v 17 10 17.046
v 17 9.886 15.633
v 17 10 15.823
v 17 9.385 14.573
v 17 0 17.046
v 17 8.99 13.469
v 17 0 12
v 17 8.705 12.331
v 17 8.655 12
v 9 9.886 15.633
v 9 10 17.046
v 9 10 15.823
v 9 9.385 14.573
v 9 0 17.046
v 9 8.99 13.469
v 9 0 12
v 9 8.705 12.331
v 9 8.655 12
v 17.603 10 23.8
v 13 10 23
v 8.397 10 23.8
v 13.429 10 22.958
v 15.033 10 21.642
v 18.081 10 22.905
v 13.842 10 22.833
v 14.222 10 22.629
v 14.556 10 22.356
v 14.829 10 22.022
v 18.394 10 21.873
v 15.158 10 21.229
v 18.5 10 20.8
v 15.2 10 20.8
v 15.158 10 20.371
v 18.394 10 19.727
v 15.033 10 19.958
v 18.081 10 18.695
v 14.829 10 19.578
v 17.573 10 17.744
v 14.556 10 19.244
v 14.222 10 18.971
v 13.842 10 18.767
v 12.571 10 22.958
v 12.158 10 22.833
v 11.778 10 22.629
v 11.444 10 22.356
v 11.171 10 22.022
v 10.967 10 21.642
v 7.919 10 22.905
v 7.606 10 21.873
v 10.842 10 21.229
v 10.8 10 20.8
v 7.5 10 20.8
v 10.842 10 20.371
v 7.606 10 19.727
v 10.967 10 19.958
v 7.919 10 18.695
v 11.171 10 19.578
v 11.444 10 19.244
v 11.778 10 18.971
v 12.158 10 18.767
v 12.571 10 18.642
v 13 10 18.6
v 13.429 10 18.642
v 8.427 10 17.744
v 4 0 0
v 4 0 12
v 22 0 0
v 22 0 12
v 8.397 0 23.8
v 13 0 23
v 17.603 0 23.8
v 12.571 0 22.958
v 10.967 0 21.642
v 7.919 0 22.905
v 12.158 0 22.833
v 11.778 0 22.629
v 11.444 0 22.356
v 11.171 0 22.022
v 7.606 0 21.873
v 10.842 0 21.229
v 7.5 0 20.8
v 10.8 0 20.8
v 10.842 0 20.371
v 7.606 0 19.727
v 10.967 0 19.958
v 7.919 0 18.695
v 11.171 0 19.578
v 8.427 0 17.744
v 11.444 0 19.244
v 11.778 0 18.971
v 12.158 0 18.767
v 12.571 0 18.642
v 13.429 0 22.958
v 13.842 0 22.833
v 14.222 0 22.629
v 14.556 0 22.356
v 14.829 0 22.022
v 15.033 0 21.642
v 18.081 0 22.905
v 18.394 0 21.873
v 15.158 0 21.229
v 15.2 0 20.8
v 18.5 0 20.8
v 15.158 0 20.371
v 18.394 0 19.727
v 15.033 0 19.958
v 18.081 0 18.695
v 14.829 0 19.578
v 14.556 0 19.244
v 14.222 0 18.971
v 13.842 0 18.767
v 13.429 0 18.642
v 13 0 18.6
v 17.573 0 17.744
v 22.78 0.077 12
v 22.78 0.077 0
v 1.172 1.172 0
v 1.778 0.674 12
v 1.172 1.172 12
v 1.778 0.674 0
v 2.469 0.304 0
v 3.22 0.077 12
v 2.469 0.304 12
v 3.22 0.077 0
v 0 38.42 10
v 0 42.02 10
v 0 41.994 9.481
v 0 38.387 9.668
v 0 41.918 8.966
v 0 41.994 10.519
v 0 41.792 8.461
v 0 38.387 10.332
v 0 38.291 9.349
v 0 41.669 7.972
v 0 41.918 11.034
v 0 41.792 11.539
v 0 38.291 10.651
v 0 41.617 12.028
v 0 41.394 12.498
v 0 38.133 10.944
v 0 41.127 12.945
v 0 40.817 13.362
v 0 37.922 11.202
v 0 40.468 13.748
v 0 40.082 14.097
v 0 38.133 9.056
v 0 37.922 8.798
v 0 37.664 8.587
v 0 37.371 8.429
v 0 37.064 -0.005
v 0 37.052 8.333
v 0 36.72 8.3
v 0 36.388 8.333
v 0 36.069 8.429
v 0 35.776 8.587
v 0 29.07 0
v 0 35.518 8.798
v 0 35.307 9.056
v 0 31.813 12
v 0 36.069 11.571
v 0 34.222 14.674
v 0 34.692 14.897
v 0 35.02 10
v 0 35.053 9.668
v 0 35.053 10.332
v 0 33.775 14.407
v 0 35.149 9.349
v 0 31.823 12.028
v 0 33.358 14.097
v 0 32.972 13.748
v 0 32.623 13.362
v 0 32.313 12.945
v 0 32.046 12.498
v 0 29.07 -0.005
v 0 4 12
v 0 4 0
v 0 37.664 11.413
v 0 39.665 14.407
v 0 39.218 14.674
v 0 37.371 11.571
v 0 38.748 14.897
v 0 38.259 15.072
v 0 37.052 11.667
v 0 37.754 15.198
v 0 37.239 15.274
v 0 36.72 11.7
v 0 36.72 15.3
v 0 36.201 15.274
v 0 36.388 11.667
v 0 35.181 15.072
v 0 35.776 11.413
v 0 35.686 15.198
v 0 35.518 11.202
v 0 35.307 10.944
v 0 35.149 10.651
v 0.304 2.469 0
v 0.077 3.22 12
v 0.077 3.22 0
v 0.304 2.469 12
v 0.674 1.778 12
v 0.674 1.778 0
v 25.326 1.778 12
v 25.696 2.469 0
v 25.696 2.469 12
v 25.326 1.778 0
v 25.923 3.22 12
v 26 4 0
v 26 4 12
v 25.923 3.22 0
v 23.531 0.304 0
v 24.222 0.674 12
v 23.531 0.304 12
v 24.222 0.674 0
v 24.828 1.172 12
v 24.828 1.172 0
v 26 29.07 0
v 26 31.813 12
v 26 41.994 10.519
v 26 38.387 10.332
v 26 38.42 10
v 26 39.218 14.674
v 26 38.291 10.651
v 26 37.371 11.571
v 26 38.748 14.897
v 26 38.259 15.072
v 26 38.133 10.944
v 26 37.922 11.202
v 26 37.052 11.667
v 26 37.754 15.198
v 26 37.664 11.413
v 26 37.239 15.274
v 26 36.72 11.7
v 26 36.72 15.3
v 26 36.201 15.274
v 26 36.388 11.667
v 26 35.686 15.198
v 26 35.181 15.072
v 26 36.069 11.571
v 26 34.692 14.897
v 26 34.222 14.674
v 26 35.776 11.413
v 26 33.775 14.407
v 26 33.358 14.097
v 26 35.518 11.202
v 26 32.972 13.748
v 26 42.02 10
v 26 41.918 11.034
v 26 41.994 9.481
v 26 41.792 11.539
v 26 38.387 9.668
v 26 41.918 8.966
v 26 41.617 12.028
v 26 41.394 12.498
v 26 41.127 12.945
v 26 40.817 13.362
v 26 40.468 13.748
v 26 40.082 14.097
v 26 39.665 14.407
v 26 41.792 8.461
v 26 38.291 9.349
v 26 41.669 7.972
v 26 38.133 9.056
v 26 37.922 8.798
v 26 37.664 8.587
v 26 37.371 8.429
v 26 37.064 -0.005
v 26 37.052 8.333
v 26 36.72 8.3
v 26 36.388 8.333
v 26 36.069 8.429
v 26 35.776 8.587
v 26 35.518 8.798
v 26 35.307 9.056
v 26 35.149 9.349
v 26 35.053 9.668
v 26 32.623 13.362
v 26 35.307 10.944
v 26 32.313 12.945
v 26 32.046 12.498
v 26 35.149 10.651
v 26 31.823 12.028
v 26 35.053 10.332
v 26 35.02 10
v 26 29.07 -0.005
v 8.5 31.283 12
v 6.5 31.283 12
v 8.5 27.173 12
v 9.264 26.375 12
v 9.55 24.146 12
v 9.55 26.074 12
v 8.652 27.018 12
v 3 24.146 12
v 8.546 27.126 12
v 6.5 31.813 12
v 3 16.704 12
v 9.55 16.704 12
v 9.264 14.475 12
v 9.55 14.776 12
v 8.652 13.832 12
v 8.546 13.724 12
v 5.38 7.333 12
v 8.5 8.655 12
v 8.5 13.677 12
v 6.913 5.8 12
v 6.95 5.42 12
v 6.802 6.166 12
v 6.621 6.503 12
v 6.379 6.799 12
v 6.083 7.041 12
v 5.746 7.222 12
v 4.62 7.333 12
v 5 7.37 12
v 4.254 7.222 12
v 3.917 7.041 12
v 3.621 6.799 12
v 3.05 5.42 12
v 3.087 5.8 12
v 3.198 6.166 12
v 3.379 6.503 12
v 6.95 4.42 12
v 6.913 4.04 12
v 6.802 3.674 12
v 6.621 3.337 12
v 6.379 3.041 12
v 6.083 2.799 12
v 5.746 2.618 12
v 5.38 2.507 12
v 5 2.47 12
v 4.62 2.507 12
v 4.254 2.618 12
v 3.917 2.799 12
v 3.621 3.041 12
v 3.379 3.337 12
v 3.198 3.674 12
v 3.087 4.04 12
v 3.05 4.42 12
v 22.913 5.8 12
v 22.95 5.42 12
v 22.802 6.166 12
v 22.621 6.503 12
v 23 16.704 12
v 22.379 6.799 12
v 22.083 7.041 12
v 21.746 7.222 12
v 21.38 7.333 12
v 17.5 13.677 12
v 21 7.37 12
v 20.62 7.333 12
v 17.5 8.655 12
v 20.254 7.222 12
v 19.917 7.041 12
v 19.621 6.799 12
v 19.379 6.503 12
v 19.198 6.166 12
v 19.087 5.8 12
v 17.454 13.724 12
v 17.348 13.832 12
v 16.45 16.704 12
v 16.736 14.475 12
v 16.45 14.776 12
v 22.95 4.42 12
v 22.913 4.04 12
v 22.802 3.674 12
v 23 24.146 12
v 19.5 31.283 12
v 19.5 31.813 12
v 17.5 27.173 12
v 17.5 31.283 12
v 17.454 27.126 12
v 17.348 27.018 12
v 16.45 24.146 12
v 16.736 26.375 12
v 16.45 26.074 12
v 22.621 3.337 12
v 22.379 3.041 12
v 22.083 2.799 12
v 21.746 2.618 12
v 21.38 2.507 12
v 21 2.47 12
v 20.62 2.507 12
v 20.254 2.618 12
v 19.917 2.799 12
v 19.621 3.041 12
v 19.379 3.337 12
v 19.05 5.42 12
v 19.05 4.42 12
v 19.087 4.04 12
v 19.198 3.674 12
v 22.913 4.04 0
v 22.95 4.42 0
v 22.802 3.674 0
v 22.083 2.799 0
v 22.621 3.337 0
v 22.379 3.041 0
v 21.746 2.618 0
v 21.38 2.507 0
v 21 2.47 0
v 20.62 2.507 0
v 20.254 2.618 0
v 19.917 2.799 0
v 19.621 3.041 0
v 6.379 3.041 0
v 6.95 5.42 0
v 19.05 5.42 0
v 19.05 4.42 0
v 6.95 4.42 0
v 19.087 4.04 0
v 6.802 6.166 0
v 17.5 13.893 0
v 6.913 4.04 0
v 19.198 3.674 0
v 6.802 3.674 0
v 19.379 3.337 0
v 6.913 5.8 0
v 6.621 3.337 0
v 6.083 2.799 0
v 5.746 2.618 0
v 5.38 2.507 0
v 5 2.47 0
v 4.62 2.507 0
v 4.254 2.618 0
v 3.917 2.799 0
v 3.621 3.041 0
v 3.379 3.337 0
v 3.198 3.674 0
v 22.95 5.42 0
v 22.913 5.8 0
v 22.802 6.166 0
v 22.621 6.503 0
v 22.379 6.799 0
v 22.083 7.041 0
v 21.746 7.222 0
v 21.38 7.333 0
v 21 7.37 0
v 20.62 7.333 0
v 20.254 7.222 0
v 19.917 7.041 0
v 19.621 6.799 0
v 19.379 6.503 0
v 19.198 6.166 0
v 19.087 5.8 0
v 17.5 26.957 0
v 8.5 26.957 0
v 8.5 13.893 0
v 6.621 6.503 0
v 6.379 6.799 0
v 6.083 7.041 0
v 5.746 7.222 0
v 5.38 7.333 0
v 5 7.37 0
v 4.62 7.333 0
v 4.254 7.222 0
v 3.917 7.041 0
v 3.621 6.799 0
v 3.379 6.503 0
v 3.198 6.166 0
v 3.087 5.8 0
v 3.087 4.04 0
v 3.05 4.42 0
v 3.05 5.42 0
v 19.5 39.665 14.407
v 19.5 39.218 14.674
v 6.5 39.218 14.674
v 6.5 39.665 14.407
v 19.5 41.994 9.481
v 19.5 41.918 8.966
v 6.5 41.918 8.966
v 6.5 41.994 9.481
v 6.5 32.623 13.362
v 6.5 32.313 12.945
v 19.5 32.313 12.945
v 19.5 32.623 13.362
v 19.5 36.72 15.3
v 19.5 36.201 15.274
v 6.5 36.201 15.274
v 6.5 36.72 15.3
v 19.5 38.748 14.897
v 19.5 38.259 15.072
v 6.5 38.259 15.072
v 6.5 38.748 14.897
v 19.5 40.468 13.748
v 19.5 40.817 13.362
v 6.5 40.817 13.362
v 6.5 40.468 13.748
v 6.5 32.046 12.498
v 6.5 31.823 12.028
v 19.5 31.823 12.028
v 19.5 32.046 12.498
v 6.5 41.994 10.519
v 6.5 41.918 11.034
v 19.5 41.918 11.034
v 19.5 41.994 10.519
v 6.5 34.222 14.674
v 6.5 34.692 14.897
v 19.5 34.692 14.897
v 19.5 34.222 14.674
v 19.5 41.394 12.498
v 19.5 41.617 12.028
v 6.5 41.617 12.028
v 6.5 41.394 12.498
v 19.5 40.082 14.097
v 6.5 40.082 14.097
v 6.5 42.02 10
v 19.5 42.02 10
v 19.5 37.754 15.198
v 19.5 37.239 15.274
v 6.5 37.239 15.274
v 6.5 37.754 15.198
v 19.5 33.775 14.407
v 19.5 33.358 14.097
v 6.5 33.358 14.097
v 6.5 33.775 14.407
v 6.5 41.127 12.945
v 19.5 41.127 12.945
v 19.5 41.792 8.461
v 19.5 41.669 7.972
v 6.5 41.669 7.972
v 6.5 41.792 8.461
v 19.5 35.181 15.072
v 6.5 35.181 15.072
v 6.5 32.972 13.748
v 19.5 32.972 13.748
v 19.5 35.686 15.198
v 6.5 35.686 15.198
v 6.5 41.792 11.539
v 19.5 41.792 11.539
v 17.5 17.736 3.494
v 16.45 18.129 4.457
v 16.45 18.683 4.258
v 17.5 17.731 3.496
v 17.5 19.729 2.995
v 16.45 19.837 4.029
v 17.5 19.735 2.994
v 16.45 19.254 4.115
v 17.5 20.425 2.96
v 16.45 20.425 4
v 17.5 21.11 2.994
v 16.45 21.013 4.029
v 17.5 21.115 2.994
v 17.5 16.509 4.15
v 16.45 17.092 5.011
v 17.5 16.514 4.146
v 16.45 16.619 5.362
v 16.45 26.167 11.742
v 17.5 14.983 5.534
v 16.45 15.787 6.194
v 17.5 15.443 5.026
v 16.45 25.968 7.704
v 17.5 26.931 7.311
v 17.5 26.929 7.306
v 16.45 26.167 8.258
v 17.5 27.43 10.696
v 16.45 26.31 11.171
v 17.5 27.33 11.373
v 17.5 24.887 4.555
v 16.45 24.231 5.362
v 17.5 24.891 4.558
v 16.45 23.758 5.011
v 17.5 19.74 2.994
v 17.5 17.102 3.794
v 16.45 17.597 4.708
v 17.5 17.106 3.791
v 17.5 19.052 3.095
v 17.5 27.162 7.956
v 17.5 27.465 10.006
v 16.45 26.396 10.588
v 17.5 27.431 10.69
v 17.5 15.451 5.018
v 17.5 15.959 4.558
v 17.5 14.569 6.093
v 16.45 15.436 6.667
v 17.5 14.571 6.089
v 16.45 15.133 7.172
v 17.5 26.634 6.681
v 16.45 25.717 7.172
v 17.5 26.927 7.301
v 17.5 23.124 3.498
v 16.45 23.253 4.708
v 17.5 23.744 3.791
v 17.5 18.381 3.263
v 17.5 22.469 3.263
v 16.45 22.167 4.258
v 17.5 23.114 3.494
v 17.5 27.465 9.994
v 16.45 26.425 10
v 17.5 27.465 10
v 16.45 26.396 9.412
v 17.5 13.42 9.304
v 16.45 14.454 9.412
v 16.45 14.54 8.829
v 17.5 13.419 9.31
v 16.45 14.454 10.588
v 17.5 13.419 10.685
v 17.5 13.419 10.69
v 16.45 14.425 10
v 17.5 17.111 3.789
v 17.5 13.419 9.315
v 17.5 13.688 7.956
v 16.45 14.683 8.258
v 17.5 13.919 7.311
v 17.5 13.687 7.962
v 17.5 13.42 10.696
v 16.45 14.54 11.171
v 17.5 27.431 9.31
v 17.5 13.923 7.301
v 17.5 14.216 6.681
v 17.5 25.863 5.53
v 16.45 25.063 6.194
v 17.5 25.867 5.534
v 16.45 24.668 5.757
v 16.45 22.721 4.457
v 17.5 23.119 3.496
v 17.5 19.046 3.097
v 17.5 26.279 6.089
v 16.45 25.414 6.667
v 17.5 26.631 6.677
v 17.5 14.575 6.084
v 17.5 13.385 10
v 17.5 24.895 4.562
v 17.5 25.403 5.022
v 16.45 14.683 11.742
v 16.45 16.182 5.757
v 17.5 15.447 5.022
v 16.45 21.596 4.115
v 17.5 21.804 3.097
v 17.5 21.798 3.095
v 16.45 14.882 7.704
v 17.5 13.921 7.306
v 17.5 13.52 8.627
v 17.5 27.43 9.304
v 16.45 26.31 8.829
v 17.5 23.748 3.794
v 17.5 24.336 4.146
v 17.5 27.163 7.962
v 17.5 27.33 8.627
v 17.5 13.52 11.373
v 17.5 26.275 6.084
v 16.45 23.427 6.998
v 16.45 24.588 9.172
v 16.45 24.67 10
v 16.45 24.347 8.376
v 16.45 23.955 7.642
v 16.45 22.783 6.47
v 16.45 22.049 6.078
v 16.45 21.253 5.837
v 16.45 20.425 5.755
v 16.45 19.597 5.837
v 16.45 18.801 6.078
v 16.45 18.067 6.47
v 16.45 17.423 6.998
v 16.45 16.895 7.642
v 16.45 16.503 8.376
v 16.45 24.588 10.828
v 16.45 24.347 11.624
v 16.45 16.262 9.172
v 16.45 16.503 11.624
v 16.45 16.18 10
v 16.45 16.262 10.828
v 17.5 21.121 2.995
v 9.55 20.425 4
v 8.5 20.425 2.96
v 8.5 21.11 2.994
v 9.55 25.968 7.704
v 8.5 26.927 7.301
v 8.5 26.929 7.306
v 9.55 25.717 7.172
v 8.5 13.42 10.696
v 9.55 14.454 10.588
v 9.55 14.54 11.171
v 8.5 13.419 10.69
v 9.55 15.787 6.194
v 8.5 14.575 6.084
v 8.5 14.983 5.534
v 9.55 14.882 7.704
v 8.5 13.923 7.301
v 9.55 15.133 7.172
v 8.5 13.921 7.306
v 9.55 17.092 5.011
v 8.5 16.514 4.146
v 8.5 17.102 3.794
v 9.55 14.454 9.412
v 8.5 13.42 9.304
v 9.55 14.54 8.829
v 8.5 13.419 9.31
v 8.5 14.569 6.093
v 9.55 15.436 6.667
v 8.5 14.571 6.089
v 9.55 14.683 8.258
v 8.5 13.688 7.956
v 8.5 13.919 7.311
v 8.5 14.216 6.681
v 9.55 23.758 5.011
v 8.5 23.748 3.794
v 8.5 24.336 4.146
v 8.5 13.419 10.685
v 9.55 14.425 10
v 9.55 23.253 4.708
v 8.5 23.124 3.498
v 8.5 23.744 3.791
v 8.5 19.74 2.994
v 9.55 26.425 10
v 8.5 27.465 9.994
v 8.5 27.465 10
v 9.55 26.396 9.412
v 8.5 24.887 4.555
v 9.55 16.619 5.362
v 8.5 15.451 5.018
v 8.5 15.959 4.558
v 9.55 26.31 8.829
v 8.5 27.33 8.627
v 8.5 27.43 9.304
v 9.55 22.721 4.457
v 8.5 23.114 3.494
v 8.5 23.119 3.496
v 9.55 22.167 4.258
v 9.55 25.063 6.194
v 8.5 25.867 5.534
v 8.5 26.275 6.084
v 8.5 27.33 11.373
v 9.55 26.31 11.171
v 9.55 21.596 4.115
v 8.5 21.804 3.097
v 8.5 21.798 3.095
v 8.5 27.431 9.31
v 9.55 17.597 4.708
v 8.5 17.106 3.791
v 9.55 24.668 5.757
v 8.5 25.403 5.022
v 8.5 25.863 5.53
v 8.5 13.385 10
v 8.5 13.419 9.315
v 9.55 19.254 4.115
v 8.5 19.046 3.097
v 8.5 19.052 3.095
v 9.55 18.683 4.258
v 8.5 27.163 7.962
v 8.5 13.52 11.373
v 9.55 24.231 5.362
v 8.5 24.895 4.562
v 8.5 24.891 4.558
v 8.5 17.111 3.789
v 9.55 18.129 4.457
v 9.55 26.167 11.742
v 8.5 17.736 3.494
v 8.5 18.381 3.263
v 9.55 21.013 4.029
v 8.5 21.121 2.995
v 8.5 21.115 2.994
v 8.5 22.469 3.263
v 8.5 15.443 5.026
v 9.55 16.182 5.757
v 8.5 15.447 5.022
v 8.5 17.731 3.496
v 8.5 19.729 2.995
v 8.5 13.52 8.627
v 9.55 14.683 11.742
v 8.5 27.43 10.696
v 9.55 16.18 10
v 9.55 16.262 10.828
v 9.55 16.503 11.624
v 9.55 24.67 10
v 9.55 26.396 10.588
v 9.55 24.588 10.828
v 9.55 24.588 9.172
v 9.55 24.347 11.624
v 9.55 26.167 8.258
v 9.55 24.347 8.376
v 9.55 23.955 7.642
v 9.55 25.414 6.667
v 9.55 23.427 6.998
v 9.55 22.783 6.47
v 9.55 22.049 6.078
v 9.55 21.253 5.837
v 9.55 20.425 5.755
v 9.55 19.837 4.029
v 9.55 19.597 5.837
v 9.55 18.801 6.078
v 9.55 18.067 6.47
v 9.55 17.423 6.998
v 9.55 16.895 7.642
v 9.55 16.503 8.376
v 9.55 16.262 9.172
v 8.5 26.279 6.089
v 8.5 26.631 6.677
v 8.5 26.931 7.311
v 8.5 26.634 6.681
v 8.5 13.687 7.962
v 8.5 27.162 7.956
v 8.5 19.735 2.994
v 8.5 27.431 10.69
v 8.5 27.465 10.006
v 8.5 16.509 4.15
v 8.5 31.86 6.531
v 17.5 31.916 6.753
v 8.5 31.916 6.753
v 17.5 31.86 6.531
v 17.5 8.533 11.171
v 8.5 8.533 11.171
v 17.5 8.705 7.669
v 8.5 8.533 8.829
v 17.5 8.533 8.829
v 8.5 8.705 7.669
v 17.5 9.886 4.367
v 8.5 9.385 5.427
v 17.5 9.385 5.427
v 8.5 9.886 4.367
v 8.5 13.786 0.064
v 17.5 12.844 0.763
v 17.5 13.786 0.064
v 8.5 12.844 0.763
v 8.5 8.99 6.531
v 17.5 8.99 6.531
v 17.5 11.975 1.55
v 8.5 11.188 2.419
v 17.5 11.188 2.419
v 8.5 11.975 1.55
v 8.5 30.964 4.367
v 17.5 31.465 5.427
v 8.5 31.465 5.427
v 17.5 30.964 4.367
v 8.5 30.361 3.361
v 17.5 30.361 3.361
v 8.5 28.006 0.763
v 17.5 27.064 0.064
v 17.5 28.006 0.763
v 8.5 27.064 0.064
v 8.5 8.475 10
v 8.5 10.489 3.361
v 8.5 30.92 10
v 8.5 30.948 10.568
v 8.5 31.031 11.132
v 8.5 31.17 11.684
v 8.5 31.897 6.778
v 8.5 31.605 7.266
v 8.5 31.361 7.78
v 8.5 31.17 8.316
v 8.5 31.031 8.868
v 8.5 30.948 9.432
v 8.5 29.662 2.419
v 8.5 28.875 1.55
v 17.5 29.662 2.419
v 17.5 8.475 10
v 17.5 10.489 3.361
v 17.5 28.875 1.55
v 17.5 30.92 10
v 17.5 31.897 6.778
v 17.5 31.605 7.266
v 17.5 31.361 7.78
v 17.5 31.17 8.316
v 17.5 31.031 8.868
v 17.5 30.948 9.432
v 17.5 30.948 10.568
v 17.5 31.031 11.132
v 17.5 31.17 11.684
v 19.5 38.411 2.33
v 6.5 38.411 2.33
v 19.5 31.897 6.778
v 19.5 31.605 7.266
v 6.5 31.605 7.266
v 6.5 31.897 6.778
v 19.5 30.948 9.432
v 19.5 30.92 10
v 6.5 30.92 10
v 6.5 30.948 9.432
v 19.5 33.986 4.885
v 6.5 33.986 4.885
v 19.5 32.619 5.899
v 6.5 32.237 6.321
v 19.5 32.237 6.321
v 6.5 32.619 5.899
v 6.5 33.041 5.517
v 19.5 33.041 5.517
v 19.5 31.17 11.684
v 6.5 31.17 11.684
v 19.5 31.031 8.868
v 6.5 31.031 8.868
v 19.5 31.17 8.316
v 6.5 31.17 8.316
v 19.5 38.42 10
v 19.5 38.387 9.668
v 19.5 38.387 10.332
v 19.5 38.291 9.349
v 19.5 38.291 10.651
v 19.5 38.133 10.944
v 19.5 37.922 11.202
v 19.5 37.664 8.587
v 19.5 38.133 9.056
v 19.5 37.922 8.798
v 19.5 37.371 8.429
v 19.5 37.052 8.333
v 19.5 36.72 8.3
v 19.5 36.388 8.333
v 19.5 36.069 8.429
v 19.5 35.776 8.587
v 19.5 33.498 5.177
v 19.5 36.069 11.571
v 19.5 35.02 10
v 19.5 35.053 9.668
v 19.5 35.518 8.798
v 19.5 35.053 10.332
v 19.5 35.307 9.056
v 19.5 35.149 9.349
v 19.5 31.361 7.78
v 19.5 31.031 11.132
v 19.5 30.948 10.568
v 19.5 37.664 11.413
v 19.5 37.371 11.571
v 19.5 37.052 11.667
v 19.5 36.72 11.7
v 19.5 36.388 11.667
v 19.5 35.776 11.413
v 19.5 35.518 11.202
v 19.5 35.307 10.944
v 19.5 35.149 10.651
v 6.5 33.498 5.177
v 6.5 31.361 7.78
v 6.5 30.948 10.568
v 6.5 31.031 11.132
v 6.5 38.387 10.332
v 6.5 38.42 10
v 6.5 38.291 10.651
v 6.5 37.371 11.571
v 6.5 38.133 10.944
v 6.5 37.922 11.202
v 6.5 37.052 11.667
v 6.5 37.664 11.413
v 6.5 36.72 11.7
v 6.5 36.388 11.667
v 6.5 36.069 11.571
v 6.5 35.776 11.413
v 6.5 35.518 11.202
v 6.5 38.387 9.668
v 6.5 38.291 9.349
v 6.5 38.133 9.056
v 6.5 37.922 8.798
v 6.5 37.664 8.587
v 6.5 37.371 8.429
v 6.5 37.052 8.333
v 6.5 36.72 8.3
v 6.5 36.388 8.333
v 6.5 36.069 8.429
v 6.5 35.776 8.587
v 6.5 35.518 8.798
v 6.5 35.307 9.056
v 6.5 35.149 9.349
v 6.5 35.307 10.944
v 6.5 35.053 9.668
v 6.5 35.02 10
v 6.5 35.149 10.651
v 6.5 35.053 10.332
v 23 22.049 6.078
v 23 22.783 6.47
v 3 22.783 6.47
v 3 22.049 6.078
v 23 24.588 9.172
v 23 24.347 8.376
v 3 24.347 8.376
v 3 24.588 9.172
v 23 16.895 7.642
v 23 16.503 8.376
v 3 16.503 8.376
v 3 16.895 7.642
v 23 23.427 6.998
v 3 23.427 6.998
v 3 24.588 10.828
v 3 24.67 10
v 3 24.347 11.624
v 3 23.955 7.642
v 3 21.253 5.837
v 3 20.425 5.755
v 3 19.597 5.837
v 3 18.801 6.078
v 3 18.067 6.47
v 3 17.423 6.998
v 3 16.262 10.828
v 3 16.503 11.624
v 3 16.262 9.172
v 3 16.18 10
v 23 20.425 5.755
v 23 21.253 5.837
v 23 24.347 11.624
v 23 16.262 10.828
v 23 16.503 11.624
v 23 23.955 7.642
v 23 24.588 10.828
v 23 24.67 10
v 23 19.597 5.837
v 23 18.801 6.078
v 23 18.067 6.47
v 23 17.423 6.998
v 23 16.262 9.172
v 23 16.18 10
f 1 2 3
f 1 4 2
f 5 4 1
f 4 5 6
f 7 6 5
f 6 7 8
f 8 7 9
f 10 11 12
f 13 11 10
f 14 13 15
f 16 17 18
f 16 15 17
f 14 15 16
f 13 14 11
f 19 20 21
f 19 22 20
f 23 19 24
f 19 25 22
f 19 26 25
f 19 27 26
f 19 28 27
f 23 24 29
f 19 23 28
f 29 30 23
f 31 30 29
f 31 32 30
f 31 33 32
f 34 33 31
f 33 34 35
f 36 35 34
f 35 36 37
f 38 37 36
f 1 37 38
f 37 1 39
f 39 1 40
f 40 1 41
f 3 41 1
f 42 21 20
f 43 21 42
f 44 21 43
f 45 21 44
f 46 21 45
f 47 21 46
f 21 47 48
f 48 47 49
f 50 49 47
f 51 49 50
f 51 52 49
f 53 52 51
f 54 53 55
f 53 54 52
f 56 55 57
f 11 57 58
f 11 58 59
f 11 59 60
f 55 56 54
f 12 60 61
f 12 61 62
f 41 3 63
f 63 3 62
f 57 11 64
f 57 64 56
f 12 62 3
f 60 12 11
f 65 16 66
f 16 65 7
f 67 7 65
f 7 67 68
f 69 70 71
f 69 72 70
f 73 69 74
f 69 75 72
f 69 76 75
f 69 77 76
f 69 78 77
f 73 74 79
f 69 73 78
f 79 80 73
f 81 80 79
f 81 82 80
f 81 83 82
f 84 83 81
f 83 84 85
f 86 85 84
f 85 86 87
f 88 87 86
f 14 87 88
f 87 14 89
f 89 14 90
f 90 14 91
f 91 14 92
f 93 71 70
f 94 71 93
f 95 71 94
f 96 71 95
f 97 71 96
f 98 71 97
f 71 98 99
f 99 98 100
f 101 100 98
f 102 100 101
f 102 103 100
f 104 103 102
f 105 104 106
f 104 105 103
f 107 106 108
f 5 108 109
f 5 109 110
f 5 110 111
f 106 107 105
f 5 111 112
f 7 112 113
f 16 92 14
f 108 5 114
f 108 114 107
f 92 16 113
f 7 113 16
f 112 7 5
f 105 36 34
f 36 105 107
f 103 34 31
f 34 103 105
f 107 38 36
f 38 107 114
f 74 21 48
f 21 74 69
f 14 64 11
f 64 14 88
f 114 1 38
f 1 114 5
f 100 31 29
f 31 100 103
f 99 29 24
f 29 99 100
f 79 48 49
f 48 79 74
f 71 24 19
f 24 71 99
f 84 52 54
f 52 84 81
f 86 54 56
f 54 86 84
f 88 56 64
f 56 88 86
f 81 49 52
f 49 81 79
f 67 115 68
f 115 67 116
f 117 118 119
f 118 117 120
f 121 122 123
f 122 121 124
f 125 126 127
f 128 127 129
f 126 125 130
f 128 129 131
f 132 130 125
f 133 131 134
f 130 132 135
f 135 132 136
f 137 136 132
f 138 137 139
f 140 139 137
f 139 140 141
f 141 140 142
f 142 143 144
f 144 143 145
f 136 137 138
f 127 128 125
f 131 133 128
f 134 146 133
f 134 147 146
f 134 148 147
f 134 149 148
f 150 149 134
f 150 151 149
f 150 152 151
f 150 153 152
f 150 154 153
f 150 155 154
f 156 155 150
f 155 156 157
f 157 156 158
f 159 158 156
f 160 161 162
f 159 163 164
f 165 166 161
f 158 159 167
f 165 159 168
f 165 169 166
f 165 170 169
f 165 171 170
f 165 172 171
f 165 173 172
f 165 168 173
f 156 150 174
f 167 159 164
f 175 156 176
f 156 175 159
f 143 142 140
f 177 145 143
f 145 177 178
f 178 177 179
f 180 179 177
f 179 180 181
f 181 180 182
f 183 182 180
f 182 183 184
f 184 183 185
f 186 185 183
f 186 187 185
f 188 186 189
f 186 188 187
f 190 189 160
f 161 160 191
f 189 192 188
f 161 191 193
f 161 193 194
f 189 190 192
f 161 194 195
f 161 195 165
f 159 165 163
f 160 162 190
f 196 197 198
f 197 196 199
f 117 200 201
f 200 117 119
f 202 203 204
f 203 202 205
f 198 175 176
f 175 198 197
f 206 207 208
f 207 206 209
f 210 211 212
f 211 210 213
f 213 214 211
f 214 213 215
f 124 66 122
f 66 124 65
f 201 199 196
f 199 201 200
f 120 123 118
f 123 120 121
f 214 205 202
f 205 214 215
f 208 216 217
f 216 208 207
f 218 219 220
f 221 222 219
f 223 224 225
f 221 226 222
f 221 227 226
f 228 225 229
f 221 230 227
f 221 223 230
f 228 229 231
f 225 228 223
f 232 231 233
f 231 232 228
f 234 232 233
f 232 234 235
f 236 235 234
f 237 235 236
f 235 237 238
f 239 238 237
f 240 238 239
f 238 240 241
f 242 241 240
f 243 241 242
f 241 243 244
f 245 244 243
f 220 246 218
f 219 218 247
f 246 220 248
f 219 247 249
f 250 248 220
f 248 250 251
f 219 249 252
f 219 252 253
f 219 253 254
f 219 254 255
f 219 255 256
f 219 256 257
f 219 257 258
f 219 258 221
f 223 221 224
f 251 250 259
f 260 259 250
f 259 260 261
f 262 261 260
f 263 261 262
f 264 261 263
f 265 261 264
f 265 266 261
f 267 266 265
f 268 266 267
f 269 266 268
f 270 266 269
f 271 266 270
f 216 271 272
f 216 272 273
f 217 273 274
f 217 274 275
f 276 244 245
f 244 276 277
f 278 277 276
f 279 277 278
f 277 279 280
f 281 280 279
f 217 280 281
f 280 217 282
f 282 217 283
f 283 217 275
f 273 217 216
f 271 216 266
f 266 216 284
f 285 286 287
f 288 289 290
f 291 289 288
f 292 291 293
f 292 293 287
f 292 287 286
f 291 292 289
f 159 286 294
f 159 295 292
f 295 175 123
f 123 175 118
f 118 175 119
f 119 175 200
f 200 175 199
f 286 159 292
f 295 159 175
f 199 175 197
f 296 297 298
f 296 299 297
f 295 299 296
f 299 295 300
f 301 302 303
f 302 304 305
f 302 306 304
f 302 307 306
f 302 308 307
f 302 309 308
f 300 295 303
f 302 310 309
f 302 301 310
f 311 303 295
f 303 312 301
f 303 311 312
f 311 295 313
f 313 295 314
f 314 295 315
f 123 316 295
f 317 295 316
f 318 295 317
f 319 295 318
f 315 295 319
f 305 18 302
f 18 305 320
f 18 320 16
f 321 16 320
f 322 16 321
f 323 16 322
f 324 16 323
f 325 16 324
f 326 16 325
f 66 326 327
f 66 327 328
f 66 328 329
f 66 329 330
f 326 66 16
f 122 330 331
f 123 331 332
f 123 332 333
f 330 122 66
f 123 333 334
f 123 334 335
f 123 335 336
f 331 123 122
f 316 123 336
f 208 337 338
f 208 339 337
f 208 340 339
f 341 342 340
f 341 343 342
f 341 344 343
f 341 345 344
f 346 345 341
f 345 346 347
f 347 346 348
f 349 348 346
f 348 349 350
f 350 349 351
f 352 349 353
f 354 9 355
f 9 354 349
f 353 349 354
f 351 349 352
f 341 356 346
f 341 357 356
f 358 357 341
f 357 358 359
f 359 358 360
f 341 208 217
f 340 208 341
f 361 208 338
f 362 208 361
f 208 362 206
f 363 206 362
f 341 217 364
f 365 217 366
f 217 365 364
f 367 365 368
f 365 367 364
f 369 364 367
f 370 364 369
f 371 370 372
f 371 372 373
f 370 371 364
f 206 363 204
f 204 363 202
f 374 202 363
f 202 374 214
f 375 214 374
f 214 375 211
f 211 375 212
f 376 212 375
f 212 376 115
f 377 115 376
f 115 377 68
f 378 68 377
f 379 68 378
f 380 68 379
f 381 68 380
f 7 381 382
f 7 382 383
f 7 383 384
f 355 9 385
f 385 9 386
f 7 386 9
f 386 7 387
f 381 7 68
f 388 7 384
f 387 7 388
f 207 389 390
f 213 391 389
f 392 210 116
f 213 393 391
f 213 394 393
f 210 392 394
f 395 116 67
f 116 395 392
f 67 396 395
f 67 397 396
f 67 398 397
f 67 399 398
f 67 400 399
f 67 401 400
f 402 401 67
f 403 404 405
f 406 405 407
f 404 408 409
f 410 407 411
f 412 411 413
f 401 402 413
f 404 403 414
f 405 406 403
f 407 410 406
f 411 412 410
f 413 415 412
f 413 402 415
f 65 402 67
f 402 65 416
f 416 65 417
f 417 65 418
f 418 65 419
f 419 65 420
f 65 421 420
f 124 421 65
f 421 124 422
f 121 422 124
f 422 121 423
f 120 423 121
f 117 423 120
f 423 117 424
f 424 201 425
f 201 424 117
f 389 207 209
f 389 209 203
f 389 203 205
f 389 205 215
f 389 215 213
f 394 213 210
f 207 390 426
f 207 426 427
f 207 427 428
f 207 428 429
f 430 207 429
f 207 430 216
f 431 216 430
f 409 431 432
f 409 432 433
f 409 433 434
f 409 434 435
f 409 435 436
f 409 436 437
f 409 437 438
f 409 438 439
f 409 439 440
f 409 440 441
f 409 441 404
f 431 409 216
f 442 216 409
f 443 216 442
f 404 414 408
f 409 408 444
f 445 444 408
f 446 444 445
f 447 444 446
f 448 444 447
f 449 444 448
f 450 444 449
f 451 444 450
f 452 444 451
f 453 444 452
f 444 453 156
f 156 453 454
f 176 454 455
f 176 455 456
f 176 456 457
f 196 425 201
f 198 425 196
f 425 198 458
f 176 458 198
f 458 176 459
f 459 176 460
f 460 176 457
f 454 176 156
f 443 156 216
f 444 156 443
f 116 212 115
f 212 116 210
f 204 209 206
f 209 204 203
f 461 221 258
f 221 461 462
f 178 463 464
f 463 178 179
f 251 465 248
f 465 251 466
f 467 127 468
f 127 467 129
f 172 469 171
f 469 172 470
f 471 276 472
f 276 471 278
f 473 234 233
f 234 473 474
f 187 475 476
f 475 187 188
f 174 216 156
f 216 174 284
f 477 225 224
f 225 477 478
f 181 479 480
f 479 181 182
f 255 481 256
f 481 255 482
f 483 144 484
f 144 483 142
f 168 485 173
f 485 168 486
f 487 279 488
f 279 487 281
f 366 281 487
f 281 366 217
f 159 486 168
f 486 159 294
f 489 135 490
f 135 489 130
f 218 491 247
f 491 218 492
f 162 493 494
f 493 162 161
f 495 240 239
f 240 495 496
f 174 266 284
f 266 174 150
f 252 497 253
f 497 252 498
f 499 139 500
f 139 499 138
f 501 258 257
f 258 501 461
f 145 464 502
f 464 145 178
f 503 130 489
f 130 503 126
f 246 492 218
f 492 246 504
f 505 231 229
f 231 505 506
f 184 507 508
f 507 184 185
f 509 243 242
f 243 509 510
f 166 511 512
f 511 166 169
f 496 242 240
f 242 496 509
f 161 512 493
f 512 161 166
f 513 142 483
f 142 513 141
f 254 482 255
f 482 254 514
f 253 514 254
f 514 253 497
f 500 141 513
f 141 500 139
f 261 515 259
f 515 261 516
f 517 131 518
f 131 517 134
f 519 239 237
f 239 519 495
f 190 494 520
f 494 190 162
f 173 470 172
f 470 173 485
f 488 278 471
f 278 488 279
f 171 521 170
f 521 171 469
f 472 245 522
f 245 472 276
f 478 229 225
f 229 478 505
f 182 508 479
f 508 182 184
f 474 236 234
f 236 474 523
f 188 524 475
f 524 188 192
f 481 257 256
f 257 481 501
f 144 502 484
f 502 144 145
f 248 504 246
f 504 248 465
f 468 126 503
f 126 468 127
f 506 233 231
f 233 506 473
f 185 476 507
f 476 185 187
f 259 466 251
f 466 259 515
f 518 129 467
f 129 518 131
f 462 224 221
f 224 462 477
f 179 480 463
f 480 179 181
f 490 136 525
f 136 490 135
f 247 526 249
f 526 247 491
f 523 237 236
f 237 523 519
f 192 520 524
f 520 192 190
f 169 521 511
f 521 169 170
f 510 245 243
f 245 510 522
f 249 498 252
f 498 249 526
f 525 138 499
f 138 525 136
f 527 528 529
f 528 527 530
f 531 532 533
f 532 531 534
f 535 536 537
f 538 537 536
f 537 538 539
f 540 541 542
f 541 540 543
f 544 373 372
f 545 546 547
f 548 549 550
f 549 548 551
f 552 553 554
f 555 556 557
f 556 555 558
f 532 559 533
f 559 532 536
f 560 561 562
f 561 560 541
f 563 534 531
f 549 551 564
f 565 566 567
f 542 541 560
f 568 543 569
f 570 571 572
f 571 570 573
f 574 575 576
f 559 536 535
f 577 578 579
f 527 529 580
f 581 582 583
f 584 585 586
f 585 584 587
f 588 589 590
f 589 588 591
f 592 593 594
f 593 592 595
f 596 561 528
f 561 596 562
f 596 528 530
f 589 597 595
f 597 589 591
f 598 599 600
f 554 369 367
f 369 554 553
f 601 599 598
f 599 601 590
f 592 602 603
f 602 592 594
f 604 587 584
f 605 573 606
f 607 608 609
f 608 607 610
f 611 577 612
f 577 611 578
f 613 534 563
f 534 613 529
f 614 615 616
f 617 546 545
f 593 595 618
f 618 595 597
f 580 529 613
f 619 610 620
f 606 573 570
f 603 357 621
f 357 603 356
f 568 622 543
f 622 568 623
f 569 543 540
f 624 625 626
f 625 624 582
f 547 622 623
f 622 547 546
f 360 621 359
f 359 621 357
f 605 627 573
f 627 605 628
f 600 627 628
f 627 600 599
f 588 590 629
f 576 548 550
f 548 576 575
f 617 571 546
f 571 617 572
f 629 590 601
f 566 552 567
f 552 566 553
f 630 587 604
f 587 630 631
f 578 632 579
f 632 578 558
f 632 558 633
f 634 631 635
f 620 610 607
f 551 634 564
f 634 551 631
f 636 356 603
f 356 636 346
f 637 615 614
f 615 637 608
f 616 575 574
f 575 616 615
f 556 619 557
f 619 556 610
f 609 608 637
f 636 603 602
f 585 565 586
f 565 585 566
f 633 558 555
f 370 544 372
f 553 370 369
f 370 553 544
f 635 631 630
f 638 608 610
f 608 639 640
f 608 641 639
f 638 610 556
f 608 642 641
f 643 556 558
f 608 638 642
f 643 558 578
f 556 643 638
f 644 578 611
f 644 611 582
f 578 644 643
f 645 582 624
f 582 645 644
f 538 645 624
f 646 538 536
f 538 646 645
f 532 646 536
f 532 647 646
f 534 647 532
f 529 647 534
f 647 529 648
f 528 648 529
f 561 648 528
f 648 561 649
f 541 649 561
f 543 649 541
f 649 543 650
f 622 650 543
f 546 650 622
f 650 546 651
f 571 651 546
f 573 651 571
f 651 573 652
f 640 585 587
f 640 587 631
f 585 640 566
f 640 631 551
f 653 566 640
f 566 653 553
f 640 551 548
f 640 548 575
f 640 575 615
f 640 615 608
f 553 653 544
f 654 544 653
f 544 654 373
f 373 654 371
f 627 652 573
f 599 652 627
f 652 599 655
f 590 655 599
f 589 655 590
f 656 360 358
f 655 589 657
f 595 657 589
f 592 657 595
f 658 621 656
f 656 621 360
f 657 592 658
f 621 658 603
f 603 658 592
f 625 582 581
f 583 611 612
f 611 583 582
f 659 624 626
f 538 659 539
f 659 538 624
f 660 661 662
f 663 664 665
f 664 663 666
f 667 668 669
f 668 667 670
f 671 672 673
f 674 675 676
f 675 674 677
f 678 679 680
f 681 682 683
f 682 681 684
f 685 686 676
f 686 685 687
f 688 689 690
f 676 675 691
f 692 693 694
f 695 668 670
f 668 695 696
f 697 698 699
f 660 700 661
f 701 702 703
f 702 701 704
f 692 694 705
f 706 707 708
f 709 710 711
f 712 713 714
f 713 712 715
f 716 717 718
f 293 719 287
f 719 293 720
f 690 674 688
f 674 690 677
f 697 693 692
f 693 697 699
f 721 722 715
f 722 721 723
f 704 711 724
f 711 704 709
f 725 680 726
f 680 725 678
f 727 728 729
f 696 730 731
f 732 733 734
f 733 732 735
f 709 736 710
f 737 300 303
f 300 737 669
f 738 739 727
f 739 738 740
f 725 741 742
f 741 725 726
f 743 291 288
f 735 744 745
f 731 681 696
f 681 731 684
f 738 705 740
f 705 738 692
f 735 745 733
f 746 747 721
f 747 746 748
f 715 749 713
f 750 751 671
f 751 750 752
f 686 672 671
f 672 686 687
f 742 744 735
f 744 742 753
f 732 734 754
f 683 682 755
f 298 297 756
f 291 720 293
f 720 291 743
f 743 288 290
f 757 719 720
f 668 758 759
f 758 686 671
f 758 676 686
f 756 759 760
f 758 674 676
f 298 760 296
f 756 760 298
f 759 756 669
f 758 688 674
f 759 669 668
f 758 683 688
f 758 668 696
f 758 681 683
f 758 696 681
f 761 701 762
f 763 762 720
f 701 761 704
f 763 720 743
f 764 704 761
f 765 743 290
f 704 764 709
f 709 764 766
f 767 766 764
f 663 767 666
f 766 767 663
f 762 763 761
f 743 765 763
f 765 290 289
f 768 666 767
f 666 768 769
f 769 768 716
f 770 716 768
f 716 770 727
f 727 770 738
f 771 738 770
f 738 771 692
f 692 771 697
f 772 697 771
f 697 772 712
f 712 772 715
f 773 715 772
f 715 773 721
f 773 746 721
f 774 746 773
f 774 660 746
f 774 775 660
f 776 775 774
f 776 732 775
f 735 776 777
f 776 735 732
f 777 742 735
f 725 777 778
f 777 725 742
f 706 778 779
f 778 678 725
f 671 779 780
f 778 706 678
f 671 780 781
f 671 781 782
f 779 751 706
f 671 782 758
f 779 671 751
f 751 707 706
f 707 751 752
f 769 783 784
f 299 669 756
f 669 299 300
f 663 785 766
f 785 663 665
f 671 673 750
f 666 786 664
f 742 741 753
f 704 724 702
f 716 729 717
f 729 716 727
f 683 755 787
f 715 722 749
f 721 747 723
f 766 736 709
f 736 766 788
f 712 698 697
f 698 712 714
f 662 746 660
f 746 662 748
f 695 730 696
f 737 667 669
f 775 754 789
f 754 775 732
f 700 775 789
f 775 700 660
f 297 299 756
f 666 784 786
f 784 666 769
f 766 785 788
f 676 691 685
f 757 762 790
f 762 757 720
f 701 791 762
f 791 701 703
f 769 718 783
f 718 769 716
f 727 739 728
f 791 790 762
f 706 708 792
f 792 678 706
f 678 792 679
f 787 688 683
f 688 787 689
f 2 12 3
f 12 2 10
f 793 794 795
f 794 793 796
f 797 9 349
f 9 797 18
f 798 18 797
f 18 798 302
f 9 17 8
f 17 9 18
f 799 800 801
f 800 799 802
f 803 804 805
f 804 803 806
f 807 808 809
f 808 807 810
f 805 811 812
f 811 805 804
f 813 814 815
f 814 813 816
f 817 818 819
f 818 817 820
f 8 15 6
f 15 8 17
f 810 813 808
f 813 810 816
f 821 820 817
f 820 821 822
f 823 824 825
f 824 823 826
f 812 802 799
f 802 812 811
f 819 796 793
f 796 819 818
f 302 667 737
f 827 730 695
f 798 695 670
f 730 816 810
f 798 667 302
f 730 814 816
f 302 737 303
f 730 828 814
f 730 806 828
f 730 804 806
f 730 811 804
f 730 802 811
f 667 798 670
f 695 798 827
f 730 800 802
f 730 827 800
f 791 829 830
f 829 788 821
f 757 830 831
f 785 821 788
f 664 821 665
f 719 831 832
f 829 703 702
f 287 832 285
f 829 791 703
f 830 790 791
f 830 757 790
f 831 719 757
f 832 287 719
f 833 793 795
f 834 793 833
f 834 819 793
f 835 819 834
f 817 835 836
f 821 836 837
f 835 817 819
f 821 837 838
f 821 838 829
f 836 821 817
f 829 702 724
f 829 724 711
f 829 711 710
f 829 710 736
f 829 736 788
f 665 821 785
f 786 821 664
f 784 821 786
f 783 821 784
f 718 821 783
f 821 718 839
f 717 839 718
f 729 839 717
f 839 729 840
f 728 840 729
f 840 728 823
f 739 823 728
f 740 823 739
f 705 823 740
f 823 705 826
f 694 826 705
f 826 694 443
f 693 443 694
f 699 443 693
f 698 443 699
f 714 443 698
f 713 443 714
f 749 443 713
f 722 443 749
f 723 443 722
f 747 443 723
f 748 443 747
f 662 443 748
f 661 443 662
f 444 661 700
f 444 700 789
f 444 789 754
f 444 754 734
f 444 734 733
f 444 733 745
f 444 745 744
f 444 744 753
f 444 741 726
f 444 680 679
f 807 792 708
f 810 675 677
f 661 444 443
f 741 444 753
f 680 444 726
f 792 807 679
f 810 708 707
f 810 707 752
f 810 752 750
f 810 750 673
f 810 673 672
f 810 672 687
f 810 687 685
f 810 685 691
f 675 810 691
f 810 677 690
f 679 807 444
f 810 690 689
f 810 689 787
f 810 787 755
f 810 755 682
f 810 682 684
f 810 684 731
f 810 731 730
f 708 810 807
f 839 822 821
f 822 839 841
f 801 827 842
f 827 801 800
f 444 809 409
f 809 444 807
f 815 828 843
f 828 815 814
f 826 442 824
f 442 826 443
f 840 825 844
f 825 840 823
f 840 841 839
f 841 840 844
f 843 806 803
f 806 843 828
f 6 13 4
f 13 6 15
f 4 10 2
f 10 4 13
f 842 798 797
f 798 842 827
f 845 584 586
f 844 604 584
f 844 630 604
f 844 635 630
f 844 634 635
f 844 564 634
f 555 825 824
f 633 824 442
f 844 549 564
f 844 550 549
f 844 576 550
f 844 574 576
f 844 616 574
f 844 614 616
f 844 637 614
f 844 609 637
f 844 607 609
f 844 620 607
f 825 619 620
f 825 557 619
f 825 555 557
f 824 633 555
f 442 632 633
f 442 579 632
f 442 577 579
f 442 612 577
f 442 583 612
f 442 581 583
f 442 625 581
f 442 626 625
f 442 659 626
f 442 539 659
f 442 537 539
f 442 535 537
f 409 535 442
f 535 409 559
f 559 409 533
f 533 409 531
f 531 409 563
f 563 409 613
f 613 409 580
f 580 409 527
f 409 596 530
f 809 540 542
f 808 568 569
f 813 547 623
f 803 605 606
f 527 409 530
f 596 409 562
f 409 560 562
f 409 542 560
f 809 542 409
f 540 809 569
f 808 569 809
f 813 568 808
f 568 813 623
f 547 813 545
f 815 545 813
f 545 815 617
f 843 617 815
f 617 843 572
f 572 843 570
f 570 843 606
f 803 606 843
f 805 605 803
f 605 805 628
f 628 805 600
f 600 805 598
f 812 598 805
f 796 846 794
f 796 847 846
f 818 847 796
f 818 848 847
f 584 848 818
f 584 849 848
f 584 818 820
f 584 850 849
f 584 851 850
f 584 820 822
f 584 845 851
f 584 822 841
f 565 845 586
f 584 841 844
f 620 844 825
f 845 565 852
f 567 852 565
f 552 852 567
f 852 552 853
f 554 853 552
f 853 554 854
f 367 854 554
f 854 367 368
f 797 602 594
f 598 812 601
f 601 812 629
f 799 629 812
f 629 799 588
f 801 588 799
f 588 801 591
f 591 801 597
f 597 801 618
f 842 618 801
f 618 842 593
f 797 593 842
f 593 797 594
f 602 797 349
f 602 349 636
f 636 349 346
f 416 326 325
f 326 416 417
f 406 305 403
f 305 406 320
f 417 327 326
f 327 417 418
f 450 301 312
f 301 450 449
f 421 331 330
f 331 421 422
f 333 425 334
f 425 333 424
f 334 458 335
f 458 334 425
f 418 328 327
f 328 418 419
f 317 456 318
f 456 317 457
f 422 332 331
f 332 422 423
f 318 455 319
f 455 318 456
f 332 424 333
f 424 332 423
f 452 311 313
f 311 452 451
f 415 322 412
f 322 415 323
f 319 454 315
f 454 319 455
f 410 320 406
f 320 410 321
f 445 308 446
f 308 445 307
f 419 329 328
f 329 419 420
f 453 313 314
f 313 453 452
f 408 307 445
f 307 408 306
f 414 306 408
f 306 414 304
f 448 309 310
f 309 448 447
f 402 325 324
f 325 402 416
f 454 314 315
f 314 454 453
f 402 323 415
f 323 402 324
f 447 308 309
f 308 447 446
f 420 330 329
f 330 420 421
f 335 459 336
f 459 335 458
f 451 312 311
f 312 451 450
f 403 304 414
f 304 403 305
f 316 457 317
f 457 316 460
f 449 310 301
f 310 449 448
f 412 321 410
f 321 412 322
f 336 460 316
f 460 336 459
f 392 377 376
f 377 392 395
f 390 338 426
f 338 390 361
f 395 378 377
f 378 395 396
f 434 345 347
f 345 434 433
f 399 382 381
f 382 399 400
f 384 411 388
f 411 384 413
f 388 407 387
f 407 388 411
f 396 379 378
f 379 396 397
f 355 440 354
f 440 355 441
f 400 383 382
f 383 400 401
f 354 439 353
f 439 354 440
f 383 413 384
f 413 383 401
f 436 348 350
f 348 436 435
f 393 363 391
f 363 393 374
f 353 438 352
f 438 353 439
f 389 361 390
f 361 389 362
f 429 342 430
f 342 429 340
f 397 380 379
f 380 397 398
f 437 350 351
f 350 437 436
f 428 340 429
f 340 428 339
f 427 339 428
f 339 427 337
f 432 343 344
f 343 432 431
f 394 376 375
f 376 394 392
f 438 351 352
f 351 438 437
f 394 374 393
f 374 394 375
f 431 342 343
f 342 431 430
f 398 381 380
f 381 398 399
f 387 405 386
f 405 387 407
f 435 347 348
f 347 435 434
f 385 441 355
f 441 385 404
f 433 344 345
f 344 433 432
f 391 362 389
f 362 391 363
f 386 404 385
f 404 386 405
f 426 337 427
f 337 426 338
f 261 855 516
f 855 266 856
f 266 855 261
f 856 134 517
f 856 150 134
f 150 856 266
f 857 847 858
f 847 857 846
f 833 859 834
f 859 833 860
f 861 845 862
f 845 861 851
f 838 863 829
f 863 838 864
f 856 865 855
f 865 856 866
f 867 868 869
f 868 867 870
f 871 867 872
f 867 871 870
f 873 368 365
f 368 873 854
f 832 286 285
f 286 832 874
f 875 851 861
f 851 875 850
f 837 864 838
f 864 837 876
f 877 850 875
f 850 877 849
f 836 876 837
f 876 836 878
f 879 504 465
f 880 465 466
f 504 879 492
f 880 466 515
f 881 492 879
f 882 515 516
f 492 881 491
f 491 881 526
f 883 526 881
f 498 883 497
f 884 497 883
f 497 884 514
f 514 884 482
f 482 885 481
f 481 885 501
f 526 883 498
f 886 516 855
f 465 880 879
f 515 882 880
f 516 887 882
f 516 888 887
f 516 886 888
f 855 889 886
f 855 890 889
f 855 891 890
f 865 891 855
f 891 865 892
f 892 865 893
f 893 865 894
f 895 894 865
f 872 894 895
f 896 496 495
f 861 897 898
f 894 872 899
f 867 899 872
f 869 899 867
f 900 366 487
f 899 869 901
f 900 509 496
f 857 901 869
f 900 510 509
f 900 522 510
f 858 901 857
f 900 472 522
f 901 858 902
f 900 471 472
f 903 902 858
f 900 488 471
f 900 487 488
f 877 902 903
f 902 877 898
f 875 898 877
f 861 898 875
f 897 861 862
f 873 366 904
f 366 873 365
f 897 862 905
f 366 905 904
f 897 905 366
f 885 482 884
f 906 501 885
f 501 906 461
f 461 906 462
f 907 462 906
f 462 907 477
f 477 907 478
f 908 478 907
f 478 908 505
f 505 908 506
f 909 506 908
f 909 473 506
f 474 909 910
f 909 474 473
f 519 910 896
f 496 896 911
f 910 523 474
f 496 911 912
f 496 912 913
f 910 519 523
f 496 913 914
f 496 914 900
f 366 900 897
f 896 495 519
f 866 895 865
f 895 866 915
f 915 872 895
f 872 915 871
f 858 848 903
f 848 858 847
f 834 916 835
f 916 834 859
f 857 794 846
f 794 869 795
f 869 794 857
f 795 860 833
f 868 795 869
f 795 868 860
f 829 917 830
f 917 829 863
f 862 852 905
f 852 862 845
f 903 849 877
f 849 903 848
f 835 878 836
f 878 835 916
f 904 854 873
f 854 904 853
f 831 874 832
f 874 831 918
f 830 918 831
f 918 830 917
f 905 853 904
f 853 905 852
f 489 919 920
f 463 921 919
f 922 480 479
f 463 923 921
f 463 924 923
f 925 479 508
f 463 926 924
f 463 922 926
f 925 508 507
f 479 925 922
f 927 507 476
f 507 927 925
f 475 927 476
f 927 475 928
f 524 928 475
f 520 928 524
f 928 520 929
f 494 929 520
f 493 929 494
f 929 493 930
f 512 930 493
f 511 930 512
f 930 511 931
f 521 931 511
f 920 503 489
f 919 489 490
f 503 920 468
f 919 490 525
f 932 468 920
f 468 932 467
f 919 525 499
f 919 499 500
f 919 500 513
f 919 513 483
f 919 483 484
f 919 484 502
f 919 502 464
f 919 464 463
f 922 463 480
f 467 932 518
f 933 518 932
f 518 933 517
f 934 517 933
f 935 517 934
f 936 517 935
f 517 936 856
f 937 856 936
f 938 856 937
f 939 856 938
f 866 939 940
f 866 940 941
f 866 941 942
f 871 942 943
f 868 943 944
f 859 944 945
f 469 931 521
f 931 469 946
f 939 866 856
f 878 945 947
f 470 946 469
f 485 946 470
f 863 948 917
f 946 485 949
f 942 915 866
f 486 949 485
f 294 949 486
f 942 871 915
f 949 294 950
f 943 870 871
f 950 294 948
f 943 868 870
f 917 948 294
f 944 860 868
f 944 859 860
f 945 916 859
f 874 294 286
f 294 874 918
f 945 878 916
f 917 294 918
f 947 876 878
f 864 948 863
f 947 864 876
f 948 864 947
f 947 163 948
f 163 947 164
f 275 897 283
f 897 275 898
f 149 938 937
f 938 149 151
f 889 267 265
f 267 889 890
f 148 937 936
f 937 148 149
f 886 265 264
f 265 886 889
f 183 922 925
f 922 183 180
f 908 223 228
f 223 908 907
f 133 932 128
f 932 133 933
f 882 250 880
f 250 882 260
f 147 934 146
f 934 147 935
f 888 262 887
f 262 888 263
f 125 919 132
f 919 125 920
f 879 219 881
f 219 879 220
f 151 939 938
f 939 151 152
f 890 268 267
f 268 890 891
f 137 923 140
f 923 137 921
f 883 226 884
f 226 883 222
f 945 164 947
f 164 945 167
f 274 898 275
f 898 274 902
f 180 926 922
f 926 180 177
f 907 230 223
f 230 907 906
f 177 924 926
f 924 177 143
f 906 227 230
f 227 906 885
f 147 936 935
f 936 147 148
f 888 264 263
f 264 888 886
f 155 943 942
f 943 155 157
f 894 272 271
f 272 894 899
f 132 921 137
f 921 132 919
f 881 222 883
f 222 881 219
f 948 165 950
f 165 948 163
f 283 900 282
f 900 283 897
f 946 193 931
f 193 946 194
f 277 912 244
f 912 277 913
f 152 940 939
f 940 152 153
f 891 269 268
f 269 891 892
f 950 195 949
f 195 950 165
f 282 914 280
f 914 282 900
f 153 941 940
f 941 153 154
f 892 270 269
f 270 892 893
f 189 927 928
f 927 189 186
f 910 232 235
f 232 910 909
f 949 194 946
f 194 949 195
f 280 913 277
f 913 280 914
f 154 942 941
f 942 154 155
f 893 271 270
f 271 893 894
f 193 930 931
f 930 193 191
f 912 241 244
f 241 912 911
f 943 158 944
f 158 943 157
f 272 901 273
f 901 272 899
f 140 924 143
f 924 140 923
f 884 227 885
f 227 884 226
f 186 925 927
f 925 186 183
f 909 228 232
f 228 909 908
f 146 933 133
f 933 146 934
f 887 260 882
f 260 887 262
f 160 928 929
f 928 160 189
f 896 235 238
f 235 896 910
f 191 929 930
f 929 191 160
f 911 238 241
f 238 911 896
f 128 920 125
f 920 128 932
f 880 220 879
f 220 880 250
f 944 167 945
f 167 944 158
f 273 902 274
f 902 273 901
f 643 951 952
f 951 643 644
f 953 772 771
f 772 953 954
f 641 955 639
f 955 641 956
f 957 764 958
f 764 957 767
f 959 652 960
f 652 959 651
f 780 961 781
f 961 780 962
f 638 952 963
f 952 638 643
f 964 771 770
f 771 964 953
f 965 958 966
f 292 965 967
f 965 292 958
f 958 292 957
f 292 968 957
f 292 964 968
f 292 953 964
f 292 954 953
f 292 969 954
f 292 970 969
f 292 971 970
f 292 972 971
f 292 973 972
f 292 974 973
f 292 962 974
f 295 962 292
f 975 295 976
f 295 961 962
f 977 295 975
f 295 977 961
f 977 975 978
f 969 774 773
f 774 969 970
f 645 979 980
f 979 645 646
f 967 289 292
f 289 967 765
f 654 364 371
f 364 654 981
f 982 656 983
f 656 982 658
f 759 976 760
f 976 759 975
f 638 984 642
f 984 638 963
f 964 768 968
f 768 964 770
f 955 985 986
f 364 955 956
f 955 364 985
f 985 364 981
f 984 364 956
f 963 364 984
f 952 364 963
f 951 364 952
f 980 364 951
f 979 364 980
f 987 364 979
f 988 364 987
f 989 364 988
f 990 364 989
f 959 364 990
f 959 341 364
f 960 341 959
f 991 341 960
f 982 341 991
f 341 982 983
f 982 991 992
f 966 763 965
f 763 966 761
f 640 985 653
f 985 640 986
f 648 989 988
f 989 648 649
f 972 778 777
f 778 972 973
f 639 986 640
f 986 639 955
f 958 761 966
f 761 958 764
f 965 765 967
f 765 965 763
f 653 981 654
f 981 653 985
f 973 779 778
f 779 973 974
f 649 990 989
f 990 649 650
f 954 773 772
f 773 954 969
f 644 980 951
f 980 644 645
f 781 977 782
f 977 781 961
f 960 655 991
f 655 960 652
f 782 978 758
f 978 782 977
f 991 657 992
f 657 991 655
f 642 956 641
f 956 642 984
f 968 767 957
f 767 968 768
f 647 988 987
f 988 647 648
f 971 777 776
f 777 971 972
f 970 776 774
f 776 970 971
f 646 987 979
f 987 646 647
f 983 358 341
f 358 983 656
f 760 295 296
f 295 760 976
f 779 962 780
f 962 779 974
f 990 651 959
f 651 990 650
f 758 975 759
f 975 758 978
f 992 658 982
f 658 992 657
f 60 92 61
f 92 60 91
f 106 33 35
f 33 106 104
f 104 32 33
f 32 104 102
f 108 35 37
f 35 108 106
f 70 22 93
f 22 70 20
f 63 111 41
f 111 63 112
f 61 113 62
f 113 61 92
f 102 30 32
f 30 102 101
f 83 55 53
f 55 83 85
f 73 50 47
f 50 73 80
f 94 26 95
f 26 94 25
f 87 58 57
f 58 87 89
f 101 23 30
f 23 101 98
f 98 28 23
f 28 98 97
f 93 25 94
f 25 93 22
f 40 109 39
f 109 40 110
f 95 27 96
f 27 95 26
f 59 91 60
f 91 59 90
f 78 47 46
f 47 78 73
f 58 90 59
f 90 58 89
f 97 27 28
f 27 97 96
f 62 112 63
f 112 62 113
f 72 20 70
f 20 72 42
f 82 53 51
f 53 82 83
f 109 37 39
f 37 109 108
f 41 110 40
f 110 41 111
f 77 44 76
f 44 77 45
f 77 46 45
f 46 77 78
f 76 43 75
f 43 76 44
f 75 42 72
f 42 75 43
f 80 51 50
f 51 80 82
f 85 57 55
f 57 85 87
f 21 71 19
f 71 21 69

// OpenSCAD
fudge=0.1;
neglectable=0.01;

$fn=32;

idler_width=26;
idler_length=36.72;
idler_height=12;

idler_hinge_y=10;
idler_hinge_z=20;
idler_hinge_screw_diameter=3.4;
idler_hinge_diameter=10.6;
idler_hinge_position=[idler_width/2,36.72,10];
idler_hinge_angle=60;
idler_hinge_cutout_diameter=11.6;
idler_hinge_cutout_width=13;
idler_hinge_cutout_angle=-30;

idler_rod_diameter=8.49;
idler_rod_length=20;
idler_rod_position=[idler_width/2,20.425,10];

idler_bearing_diameter=23.9;
idler_bearing_width=9;

idler_bearing_rim_diameter_1=12;
idler_bearing_rim_diameter_2=14.1;
idler_bearing_rim_width=1.05;

corner_radius=4;


idler_screw_hole_distance=16;
idler_screw_hole_y=4.92;
idler_screw_hole_length=4.9;
idler_screw_hole_diameter=3.9;

idler_guide_height=8.8;
idler_guide_width=8;
idler_guide_length=10;
idler_guide_hole_z=20.8;
idler_guide_hole_diameter=4.4;
idler_guide_ring_diameter=11;
idler_guide_max_z=23.8;


idler();
//idler_hinge_block();
//vanilla_idler();

module idler_guide_max_z_cutout(){
	translate([idler_width/2-idler_guide_ring_diameter/2-fudge,-fudge,idler_guide_max_z])
		cube([idler_guide_ring_diameter+2*fudge,idler_guide_length+2*fudge,idler_guide_ring_diameter+fudge]);
}

module idler_guide(){
	difference(){
		idler_guide_block();
		idler_guide_hole_cutout();
	}	
}

module idler_guide_hole_cutout(){
	translate([idler_width/2,0,idler_guide_hole_z])
		rotate([-90,0,0])
			translate([0,0,-fudge])
				cylinder(r=idler_guide_hole_diameter/2,h=idler_guide_length+2*fudge);
}

module idler_guide_block(){
	translate([(idler_width-idler_guide_width)/2,0,idler_height-fudge])
		cube([idler_guide_width,idler_guide_length,idler_guide_height+fudge]);
	translate([idler_width/2,0,idler_guide_hole_z])
		rotate([-90,0,0])
			cylinder(r=idler_guide_ring_diameter/2,h=idler_guide_length);
}

module idler(){
	difference(){
		idler_block();
		idler_hinge_angle_cutout();	
		idler_hinge_cutout();
		idler_hinge_screw_cutout();
		idler_bearing_cutout();
		idler_rod_cutout();
		idler_screw_holes();
		idler_guide_hole_cutout();
		idler_guide_max_z_cutout();
	}	
}

module idler_block(){
	idler_body();
	idler_guide_block();
	idler_hinge_block();	
}


module idler_screw_holes(){
	translate([idler_width/2,idler_screw_hole_y,-fudge])
		for(x=[-1,1])
			translate([x*idler_screw_hole_distance/2,0,0])
				hull(){
					for(y=[-1,1])
						translate([0,y*(idler_screw_hole_length-idler_screw_hole_diameter)/2,0])
							cylinder(r=idler_screw_hole_diameter/2,h=idler_height+2*fudge);
				}
}


//idler_body();

module idler_body(){
	hull(){
		translate([corner_radius,corner_radius,0])
			cylinder(r=corner_radius,h=idler_height);
		translate([idler_width-corner_radius,corner_radius,0])
			cylinder(r=corner_radius,h=idler_height);
		translate([0,corner_radius,0])
			cube([idler_width,idler_length-corner_radius,idler_height]);
	}
}


module idler_bearing_rim(){
	translate(idler_rod_position+[(idler_bearing_width-idler_bearing_rim_width)/2+neglectable/2,0,0])
		rotate([0,90,0])
			cylinder(r1=idler_bearing_rim_diameter_1/2,r2=idler_bearing_rim_diameter_2/2,h=idler_bearing_rim_width+neglectable,center=true,$fn=2*$fn);	
	translate(idler_rod_position-[(idler_bearing_width-idler_bearing_rim_width)/2+neglectable/2,0,0])
		rotate([0,90,0])
			cylinder(r1=idler_bearing_rim_diameter_2/2,r2=idler_bearing_rim_diameter_1/2,h=idler_bearing_rim_width+neglectable,center=true,$fn=2*$fn);	
}

module idler_bearing_cutout_block(){
	translate(idler_rod_position)
		rotate([0,90,0])
			cylinder(r=idler_bearing_diameter/2,h=idler_bearing_width,center=true,$fn=2*$fn);	
}

module idler_bearing_cutout(){
	difference(){
		idler_bearing_cutout_block();
		idler_bearing_rim();
	}
}


module idler_rod_cutout(){
	translate(idler_rod_position)
		rotate([0,90,0])
			cylinder(r=idler_rod_diameter/2,h=idler_rod_length,center=true);	
}

module idler_hinge_screw_cutout(){
	translate(idler_hinge_position)
		rotate([0,90,0])
			cylinder(r=idler_hinge_screw_diameter/2,h=idler_width+2*fudge,center=true);
}


module idler_hinge_block(){
	hull(){
		translate(idler_hinge_position)
			rotate([0,90,0])
				cylinder(r=idler_hinge_diameter/2,h=idler_width,center=true,$fn=2*$fn);
	
		//translate(idler_hinge_position+[0,(idler_hinge_position[2]-idler_hinge_diameter/2)*cos(180+idler_hinge_angle),(idler_hinge_position[2]-idler_hinge_diameter/2)*sin(180+idler_hinge_angle)])
		//translate(idler_hinge_position+[0,0,-idler_hinge_position[2]+idler_hinge_diameter/2])
			//rotate([0,90,0])
				//cylinder(r=idler_hinge_diameter/2,h=idler_width,center=true,$fn=2*$fn);
		translate([idler_hinge_position[0],idler_hinge_position[1]+(idler_hinge_position[2]-idler_hinge_diameter/2)*cos(180+idler_hinge_angle),0])
			cube([idler_width,idler_hinge_diameter,neglectable],center=true);
	}
}

module idler_hinge_angle_cutout(){
	translate(idler_hinge_position)
		rotate([idler_hinge_angle-90,0,0])
			translate([0,idler_hinge_diameter,0])
				cube([idler_width+2*fudge,idler_hinge_diameter,idler_length],center=true);
}


module idler_hinge_cutout(){
	hull(){
		translate(idler_hinge_position)
			rotate([0,90,0])
				cylinder(r=idler_hinge_cutout_diameter/2,h=idler_hinge_cutout_width,center=true,$fn=2*$fn);
	
		translate(idler_hinge_position+[0,idler_length*cos(idler_hinge_cutout_angle),idler_length*sin(idler_hinge_cutout_angle)])
			rotate([0,90,0])
				cylinder(r=idler_hinge_cutout_diameter/2,h=idler_hinge_cutout_width,center=true,$fn=2*$fn);
	}
}

module vanilla_idler(){
	translate([-1,-1.5749,-0.0445])
		import("EXTRUDER-IDLER-GUIDE.stl");
}
